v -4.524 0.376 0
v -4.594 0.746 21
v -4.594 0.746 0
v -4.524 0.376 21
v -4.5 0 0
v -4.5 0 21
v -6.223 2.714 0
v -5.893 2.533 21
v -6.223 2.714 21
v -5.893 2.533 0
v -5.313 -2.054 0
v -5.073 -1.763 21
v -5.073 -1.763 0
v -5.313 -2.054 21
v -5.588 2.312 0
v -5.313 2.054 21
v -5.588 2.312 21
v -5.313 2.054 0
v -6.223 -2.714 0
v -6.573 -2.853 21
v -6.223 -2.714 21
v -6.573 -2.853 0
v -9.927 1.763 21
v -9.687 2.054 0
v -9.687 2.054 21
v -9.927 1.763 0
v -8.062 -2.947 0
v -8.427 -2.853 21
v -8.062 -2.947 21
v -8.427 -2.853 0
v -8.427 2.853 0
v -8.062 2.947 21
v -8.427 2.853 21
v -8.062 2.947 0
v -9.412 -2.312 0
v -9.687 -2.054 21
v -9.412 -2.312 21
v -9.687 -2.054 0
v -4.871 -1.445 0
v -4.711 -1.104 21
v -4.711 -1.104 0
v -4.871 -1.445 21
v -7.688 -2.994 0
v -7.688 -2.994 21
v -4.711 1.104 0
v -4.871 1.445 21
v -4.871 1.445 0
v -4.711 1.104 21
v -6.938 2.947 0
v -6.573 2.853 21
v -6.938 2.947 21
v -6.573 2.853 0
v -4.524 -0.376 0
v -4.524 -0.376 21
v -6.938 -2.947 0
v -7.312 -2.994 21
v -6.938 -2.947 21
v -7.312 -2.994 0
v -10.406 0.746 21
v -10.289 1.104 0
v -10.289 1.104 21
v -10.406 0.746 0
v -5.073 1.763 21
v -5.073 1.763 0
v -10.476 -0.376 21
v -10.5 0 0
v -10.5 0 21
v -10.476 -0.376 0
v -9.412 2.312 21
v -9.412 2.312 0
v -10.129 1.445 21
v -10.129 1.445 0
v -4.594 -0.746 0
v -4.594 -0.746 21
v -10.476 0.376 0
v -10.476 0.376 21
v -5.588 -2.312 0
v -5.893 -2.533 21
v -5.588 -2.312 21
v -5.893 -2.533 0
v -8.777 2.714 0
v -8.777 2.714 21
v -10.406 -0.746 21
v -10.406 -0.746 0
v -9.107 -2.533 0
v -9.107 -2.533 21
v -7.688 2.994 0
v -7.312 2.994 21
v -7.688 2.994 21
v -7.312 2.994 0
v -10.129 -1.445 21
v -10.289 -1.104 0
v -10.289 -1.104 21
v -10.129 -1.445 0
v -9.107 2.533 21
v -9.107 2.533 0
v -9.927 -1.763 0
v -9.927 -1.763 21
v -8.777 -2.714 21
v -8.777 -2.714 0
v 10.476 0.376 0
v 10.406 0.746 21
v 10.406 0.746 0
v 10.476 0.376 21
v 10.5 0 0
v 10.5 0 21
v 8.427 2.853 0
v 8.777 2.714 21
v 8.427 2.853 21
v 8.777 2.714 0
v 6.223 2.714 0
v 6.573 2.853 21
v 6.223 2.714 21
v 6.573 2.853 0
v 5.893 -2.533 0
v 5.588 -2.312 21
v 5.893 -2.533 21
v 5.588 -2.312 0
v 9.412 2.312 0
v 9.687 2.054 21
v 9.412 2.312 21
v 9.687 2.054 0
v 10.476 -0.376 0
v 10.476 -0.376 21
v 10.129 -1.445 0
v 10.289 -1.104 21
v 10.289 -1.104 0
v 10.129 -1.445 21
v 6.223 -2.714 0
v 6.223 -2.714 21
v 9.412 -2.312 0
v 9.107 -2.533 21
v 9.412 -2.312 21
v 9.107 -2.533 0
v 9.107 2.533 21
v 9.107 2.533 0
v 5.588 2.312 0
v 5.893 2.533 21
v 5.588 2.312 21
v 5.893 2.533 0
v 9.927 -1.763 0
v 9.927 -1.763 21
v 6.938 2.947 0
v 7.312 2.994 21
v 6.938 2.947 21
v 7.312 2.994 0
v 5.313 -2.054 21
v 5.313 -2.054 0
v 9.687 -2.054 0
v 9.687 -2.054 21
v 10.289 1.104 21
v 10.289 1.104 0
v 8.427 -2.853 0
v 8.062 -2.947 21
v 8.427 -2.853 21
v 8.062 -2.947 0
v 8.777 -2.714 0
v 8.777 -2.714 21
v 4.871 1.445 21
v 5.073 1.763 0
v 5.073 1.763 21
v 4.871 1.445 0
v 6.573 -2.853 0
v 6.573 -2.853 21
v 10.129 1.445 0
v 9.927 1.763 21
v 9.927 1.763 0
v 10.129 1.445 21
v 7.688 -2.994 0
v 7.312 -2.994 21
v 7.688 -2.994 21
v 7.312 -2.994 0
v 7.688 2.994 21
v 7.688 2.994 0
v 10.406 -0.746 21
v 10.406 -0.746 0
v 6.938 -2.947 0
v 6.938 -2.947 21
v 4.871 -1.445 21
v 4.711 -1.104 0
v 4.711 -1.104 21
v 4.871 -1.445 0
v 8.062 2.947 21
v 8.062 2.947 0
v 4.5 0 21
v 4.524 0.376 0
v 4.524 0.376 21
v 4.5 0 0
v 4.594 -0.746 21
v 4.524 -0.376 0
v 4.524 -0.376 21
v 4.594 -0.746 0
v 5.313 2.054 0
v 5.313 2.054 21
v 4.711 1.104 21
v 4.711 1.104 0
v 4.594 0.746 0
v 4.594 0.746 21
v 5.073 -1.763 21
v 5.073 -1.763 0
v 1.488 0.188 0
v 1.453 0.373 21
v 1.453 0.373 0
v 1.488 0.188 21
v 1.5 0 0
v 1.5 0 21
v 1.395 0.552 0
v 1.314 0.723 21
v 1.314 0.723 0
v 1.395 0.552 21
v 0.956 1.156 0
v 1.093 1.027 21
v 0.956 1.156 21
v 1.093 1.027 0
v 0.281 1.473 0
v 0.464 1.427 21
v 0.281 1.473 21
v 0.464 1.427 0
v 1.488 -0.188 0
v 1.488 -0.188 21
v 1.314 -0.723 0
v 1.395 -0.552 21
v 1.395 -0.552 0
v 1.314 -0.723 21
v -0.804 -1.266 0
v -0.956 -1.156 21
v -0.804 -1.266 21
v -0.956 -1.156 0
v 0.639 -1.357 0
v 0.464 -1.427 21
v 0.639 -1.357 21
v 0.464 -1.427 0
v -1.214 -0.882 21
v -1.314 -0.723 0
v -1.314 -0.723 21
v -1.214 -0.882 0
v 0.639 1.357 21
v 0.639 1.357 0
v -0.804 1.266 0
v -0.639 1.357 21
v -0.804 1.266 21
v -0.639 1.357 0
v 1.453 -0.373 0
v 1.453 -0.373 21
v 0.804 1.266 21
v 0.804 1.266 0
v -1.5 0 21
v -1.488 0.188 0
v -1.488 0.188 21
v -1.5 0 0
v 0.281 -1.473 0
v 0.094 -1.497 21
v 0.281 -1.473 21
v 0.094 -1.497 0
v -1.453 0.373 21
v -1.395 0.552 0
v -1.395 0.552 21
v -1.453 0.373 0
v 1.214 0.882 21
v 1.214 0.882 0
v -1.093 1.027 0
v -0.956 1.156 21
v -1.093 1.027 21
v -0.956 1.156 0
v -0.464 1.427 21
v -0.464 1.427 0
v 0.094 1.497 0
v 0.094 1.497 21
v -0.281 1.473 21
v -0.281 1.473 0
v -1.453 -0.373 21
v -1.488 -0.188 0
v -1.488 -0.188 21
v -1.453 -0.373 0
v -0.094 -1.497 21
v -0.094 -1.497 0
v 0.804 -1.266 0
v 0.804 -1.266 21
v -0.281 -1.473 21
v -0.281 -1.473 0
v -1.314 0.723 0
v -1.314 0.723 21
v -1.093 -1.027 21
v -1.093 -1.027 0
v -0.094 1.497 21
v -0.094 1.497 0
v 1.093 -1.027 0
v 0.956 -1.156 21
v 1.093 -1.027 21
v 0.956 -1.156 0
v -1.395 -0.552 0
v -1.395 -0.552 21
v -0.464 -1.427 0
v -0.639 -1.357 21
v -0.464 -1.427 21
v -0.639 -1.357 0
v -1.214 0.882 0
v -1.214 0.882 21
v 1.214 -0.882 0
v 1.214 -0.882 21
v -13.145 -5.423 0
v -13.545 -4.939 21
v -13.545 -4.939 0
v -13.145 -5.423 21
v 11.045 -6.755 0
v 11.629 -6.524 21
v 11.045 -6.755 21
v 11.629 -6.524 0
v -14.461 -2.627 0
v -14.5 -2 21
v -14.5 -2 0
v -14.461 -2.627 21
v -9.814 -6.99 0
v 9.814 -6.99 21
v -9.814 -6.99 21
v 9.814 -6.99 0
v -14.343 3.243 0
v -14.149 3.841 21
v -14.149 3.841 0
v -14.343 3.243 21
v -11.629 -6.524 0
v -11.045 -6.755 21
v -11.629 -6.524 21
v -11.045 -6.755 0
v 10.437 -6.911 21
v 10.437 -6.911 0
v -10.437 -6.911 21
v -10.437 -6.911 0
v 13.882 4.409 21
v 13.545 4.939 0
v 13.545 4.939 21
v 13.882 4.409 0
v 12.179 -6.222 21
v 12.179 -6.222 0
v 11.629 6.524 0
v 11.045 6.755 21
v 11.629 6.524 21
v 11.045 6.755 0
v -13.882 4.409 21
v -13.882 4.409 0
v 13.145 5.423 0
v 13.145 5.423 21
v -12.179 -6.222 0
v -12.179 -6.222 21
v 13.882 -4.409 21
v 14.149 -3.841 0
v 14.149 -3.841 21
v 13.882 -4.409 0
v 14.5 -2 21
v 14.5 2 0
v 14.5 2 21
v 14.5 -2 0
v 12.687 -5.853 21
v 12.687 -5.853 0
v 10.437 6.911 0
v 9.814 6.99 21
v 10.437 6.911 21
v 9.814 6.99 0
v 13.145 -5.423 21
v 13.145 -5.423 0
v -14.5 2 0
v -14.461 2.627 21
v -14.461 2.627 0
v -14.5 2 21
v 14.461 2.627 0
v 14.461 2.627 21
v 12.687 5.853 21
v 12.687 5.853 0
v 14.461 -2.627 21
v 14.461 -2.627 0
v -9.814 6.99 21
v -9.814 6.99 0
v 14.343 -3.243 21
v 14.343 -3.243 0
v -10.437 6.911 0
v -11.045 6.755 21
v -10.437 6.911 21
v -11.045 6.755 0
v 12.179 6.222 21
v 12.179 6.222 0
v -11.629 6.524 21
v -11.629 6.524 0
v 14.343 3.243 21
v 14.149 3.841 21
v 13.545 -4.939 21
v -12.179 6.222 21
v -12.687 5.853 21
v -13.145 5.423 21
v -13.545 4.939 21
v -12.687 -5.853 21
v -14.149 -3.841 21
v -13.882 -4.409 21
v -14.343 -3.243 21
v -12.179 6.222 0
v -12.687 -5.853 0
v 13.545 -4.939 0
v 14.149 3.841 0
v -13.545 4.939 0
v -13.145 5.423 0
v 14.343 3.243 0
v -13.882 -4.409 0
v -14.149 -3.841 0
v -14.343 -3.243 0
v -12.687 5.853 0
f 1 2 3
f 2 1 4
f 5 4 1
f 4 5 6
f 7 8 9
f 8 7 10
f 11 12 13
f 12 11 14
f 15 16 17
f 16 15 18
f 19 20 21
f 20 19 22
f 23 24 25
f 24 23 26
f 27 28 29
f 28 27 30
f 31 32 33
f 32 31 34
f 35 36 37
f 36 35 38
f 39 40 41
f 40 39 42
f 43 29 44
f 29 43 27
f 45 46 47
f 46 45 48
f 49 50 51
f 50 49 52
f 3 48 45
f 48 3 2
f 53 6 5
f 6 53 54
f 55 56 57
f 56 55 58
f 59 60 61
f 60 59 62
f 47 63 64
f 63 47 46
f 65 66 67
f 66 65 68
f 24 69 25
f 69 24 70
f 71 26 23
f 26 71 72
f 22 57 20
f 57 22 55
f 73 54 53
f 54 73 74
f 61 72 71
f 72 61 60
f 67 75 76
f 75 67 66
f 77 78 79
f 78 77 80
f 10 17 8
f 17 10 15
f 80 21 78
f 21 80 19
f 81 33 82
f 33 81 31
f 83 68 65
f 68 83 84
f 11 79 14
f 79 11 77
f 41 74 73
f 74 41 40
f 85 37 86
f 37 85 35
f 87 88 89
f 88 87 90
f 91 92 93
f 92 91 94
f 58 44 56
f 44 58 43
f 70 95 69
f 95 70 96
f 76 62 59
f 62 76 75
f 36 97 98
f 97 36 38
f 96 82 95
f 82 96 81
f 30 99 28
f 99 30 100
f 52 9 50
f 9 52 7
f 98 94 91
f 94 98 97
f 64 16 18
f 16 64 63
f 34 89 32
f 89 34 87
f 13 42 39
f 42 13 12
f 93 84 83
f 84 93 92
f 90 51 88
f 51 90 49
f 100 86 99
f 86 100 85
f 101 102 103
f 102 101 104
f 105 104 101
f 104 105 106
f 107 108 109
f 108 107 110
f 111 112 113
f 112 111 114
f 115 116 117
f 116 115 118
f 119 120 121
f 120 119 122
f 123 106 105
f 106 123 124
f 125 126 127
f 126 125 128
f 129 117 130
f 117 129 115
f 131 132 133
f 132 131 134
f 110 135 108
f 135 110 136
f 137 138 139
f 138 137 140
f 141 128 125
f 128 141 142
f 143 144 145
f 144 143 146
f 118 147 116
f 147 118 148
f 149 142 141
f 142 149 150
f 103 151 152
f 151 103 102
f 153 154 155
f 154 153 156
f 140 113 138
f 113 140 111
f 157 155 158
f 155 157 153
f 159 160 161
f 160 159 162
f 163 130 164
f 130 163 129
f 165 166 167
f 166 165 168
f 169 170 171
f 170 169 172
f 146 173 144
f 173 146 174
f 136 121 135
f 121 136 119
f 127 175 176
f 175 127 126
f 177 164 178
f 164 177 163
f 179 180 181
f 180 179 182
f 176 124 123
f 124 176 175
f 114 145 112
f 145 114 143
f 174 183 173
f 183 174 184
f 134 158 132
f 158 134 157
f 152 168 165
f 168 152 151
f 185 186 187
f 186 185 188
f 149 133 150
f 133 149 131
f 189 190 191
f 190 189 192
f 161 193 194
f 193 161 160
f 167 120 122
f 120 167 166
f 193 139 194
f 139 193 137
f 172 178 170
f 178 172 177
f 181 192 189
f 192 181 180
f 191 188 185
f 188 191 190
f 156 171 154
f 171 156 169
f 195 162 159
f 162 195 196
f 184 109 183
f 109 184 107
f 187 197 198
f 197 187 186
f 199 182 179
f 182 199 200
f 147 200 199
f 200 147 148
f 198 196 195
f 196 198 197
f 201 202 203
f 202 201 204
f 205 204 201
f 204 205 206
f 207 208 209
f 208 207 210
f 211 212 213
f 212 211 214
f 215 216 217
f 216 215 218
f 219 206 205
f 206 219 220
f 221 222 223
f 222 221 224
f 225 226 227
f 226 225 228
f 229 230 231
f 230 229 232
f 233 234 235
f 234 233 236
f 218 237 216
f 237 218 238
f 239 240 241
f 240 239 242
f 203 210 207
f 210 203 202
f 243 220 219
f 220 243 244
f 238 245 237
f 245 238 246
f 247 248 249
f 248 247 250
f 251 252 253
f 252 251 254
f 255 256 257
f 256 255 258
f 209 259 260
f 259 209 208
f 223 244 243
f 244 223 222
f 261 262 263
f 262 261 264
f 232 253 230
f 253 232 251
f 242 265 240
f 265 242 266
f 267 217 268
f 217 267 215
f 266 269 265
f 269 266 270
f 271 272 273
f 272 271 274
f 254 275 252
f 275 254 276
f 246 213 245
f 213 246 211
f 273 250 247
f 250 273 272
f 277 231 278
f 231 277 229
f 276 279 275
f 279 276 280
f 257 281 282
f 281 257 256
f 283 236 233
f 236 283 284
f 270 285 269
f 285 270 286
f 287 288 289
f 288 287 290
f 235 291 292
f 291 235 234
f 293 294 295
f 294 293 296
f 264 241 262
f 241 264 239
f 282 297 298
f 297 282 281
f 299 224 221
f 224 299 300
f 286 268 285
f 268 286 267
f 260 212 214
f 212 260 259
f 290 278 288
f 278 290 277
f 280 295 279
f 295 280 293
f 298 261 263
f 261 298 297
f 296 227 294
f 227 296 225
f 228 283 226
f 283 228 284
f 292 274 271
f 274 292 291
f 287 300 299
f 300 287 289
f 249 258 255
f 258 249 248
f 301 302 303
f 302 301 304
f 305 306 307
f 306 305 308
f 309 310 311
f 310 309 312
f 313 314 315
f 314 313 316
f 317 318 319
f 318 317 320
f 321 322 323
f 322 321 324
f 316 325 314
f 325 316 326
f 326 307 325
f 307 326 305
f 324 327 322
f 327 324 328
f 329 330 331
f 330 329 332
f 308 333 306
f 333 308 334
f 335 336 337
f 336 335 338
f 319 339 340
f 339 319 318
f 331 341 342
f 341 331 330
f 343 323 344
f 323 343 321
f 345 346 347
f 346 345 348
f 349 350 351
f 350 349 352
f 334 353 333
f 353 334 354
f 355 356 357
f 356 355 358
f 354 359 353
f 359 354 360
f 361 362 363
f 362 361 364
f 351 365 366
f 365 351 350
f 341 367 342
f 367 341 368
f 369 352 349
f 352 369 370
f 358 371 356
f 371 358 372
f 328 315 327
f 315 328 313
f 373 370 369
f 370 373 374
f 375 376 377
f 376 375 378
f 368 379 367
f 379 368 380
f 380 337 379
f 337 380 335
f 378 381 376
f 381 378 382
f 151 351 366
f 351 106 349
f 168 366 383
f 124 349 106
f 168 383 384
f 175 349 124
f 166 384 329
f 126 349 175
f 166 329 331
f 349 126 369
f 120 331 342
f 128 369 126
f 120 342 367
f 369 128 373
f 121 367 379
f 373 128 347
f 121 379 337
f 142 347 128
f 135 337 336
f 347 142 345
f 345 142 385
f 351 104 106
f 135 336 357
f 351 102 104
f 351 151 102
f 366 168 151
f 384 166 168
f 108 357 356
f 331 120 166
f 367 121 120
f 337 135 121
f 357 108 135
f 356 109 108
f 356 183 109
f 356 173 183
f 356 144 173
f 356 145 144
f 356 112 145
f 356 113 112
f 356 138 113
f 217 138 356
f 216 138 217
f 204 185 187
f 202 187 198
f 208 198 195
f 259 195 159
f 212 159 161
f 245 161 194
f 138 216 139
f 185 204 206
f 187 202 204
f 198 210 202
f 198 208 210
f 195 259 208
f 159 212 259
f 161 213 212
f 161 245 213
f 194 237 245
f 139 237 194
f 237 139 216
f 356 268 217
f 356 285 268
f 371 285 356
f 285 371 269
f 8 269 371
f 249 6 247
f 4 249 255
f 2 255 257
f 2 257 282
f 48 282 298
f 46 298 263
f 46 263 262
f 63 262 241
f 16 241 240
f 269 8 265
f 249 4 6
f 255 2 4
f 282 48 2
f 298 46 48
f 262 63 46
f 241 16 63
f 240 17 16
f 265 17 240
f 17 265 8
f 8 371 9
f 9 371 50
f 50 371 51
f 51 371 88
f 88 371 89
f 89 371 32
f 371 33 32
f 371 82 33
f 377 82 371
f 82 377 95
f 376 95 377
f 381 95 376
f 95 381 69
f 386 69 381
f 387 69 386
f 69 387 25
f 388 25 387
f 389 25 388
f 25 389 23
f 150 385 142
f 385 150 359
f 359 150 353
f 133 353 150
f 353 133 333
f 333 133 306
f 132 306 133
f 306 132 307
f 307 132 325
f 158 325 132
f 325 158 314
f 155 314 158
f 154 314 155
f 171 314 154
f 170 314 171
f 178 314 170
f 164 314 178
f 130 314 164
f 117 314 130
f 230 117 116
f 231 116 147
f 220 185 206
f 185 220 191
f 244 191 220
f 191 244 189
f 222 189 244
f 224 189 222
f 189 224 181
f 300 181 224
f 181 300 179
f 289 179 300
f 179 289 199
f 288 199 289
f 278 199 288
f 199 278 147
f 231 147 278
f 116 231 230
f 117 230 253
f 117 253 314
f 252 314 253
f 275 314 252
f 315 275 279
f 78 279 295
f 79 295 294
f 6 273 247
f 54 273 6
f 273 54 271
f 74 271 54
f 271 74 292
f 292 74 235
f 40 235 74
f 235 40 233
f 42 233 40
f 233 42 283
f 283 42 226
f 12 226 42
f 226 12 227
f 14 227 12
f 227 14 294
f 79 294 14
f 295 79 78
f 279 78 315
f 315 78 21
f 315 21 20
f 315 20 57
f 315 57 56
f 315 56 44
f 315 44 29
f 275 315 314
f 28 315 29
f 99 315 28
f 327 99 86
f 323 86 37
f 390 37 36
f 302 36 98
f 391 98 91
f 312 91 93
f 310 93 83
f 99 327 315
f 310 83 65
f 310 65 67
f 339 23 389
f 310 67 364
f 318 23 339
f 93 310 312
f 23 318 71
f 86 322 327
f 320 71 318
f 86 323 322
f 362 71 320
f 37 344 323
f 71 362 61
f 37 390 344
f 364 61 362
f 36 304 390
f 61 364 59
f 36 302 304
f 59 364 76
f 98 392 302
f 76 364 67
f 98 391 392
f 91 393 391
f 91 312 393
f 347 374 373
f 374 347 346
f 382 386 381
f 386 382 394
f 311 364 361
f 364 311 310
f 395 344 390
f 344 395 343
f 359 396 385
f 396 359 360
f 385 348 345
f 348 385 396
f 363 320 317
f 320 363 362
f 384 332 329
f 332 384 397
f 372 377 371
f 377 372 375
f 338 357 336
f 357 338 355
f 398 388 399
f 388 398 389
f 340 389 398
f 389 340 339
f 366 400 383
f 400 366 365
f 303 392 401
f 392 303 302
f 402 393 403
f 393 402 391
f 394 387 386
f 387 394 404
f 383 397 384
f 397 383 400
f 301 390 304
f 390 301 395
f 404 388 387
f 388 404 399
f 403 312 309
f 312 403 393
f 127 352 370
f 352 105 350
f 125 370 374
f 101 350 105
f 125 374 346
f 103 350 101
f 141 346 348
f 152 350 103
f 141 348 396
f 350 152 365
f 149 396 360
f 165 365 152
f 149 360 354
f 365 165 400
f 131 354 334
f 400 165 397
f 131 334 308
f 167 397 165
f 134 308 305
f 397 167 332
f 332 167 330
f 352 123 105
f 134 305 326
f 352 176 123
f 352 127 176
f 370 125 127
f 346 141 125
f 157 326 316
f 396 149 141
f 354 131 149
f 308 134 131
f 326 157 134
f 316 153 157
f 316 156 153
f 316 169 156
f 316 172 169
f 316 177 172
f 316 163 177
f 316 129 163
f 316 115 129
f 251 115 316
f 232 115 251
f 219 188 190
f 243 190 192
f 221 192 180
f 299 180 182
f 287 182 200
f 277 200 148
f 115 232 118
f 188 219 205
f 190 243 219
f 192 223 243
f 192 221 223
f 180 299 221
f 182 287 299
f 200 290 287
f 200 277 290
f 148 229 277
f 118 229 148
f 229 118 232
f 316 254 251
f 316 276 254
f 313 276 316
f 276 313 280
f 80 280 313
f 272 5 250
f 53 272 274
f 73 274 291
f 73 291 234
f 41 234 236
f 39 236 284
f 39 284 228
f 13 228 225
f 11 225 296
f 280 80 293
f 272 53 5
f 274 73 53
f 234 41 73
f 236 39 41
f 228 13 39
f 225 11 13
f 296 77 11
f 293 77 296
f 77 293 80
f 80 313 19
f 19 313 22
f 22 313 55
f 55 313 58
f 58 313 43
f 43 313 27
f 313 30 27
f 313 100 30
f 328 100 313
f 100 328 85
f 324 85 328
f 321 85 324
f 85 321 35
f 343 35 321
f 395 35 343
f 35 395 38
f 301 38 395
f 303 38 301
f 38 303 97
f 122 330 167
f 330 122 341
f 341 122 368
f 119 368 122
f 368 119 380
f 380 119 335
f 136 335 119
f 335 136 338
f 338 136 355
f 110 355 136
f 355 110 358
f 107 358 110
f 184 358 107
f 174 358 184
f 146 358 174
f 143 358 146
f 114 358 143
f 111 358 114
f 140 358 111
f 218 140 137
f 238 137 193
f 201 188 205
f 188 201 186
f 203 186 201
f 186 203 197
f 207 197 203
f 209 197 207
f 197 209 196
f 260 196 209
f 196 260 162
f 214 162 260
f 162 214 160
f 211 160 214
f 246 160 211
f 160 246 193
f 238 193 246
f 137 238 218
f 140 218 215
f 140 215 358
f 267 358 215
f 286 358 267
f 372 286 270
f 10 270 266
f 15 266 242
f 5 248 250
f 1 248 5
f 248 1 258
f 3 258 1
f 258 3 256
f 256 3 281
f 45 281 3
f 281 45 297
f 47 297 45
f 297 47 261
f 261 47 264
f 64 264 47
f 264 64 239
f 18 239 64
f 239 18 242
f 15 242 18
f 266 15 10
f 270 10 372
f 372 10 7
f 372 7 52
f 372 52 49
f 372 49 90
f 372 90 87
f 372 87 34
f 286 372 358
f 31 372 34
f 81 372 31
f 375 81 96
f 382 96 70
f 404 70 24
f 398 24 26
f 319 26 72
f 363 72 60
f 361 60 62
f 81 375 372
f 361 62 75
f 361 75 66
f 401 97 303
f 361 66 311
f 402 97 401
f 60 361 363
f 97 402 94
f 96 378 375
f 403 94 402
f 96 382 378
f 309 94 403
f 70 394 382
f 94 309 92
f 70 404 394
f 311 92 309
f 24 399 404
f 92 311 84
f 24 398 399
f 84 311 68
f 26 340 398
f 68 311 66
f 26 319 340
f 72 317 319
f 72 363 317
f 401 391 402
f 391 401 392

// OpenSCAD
$fn = 50;


difference() {
	union() {
		*color(alpha = 1.0000000000, c = "gray") {
			translate(v = [0, 7, 0]) {
				linear_extrude(height = 1) {
					text(font = "Arial:style=Bold", halign = "center", size = 4.5000000000, text = "COMMENT plate main", valign = "center");
				}
			}
		}
		*color(alpha = 1.0000000000, c = "gray") {
			translate(v = [0, 14, 0]) {
				linear_extrude(height = 1) {
					text(font = "Arial:style=Bold", halign = "center", size = 4.5000000000, text = "COMMENT description oobb_plate_shape_p_type_21_depth_2_width_1_height_21_thickness_true_both_holes", valign = "center");
				}
			}
		}
		hull() {
			translate(v = [-9.5000000000, 2.0000000000, 0]) {
				cylinder(h = 21, r = 5);
			}
			translate(v = [9.5000000000, 2.0000000000, 0]) {
				cylinder(h = 21, r = 5);
			}
			translate(v = [-9.5000000000, -2.0000000000, 0]) {
				cylinder(h = 21, r = 5);
			}
			translate(v = [9.5000000000, -2.0000000000, 0]) {
				cylinder(h = 21, r = 5);
			}
		}
	}
	union() {
		*color(alpha = 1.0000000000, c = "gray") {
			translate(v = [0, 7, 0]) {
				linear_extrude(height = 1) {
					text(font = "Arial:style=Bold", halign = "center", size = 4.5000000000, text = "COMMENT holes main", valign = "center");
				}
			}
		}
		*color(alpha = 1.0000000000, c = "gray") {
			translate(v = [0, 14, 0]) {
				linear_extrude(height = 1) {
					text(font = "Arial:style=Bold", halign = "center", size = 4.5000000000, text = "COMMENT description oobb_holes_shape_n_type_2_width_1_height_21_thickness_true_both_holes", valign = "center");
				}
			}
		}
		translate(v = [-7.5000000000, 0.0000000000, 0]) {
			translate(v = [0, 0, -50]) {
				cylinder(h = 100, r = 3.0000000000);
			}
		}
		translate(v = [7.5000000000, 0.0000000000, 0]) {
			translate(v = [0, 0, -50]) {
				cylinder(h = 100, r = 3.0000000000);
			}
		}
		translate(v = [-7.5000000000, 0.0000000000, 0]) {
			translate(v = [0, 0, -50]) {
				cylinder(h = 100, r = 1.5000000000);
			}
		}
		translate(v = [0, 0, -50]) {
			cylinder(h = 100, r = 1.5000000000);
		}
		translate(v = [7.5000000000, 0.0000000000, 0]) {
			translate(v = [0, 0, -50]) {
				cylinder(h = 100, r = 1.5000000000);
			}
		}
	}
}
